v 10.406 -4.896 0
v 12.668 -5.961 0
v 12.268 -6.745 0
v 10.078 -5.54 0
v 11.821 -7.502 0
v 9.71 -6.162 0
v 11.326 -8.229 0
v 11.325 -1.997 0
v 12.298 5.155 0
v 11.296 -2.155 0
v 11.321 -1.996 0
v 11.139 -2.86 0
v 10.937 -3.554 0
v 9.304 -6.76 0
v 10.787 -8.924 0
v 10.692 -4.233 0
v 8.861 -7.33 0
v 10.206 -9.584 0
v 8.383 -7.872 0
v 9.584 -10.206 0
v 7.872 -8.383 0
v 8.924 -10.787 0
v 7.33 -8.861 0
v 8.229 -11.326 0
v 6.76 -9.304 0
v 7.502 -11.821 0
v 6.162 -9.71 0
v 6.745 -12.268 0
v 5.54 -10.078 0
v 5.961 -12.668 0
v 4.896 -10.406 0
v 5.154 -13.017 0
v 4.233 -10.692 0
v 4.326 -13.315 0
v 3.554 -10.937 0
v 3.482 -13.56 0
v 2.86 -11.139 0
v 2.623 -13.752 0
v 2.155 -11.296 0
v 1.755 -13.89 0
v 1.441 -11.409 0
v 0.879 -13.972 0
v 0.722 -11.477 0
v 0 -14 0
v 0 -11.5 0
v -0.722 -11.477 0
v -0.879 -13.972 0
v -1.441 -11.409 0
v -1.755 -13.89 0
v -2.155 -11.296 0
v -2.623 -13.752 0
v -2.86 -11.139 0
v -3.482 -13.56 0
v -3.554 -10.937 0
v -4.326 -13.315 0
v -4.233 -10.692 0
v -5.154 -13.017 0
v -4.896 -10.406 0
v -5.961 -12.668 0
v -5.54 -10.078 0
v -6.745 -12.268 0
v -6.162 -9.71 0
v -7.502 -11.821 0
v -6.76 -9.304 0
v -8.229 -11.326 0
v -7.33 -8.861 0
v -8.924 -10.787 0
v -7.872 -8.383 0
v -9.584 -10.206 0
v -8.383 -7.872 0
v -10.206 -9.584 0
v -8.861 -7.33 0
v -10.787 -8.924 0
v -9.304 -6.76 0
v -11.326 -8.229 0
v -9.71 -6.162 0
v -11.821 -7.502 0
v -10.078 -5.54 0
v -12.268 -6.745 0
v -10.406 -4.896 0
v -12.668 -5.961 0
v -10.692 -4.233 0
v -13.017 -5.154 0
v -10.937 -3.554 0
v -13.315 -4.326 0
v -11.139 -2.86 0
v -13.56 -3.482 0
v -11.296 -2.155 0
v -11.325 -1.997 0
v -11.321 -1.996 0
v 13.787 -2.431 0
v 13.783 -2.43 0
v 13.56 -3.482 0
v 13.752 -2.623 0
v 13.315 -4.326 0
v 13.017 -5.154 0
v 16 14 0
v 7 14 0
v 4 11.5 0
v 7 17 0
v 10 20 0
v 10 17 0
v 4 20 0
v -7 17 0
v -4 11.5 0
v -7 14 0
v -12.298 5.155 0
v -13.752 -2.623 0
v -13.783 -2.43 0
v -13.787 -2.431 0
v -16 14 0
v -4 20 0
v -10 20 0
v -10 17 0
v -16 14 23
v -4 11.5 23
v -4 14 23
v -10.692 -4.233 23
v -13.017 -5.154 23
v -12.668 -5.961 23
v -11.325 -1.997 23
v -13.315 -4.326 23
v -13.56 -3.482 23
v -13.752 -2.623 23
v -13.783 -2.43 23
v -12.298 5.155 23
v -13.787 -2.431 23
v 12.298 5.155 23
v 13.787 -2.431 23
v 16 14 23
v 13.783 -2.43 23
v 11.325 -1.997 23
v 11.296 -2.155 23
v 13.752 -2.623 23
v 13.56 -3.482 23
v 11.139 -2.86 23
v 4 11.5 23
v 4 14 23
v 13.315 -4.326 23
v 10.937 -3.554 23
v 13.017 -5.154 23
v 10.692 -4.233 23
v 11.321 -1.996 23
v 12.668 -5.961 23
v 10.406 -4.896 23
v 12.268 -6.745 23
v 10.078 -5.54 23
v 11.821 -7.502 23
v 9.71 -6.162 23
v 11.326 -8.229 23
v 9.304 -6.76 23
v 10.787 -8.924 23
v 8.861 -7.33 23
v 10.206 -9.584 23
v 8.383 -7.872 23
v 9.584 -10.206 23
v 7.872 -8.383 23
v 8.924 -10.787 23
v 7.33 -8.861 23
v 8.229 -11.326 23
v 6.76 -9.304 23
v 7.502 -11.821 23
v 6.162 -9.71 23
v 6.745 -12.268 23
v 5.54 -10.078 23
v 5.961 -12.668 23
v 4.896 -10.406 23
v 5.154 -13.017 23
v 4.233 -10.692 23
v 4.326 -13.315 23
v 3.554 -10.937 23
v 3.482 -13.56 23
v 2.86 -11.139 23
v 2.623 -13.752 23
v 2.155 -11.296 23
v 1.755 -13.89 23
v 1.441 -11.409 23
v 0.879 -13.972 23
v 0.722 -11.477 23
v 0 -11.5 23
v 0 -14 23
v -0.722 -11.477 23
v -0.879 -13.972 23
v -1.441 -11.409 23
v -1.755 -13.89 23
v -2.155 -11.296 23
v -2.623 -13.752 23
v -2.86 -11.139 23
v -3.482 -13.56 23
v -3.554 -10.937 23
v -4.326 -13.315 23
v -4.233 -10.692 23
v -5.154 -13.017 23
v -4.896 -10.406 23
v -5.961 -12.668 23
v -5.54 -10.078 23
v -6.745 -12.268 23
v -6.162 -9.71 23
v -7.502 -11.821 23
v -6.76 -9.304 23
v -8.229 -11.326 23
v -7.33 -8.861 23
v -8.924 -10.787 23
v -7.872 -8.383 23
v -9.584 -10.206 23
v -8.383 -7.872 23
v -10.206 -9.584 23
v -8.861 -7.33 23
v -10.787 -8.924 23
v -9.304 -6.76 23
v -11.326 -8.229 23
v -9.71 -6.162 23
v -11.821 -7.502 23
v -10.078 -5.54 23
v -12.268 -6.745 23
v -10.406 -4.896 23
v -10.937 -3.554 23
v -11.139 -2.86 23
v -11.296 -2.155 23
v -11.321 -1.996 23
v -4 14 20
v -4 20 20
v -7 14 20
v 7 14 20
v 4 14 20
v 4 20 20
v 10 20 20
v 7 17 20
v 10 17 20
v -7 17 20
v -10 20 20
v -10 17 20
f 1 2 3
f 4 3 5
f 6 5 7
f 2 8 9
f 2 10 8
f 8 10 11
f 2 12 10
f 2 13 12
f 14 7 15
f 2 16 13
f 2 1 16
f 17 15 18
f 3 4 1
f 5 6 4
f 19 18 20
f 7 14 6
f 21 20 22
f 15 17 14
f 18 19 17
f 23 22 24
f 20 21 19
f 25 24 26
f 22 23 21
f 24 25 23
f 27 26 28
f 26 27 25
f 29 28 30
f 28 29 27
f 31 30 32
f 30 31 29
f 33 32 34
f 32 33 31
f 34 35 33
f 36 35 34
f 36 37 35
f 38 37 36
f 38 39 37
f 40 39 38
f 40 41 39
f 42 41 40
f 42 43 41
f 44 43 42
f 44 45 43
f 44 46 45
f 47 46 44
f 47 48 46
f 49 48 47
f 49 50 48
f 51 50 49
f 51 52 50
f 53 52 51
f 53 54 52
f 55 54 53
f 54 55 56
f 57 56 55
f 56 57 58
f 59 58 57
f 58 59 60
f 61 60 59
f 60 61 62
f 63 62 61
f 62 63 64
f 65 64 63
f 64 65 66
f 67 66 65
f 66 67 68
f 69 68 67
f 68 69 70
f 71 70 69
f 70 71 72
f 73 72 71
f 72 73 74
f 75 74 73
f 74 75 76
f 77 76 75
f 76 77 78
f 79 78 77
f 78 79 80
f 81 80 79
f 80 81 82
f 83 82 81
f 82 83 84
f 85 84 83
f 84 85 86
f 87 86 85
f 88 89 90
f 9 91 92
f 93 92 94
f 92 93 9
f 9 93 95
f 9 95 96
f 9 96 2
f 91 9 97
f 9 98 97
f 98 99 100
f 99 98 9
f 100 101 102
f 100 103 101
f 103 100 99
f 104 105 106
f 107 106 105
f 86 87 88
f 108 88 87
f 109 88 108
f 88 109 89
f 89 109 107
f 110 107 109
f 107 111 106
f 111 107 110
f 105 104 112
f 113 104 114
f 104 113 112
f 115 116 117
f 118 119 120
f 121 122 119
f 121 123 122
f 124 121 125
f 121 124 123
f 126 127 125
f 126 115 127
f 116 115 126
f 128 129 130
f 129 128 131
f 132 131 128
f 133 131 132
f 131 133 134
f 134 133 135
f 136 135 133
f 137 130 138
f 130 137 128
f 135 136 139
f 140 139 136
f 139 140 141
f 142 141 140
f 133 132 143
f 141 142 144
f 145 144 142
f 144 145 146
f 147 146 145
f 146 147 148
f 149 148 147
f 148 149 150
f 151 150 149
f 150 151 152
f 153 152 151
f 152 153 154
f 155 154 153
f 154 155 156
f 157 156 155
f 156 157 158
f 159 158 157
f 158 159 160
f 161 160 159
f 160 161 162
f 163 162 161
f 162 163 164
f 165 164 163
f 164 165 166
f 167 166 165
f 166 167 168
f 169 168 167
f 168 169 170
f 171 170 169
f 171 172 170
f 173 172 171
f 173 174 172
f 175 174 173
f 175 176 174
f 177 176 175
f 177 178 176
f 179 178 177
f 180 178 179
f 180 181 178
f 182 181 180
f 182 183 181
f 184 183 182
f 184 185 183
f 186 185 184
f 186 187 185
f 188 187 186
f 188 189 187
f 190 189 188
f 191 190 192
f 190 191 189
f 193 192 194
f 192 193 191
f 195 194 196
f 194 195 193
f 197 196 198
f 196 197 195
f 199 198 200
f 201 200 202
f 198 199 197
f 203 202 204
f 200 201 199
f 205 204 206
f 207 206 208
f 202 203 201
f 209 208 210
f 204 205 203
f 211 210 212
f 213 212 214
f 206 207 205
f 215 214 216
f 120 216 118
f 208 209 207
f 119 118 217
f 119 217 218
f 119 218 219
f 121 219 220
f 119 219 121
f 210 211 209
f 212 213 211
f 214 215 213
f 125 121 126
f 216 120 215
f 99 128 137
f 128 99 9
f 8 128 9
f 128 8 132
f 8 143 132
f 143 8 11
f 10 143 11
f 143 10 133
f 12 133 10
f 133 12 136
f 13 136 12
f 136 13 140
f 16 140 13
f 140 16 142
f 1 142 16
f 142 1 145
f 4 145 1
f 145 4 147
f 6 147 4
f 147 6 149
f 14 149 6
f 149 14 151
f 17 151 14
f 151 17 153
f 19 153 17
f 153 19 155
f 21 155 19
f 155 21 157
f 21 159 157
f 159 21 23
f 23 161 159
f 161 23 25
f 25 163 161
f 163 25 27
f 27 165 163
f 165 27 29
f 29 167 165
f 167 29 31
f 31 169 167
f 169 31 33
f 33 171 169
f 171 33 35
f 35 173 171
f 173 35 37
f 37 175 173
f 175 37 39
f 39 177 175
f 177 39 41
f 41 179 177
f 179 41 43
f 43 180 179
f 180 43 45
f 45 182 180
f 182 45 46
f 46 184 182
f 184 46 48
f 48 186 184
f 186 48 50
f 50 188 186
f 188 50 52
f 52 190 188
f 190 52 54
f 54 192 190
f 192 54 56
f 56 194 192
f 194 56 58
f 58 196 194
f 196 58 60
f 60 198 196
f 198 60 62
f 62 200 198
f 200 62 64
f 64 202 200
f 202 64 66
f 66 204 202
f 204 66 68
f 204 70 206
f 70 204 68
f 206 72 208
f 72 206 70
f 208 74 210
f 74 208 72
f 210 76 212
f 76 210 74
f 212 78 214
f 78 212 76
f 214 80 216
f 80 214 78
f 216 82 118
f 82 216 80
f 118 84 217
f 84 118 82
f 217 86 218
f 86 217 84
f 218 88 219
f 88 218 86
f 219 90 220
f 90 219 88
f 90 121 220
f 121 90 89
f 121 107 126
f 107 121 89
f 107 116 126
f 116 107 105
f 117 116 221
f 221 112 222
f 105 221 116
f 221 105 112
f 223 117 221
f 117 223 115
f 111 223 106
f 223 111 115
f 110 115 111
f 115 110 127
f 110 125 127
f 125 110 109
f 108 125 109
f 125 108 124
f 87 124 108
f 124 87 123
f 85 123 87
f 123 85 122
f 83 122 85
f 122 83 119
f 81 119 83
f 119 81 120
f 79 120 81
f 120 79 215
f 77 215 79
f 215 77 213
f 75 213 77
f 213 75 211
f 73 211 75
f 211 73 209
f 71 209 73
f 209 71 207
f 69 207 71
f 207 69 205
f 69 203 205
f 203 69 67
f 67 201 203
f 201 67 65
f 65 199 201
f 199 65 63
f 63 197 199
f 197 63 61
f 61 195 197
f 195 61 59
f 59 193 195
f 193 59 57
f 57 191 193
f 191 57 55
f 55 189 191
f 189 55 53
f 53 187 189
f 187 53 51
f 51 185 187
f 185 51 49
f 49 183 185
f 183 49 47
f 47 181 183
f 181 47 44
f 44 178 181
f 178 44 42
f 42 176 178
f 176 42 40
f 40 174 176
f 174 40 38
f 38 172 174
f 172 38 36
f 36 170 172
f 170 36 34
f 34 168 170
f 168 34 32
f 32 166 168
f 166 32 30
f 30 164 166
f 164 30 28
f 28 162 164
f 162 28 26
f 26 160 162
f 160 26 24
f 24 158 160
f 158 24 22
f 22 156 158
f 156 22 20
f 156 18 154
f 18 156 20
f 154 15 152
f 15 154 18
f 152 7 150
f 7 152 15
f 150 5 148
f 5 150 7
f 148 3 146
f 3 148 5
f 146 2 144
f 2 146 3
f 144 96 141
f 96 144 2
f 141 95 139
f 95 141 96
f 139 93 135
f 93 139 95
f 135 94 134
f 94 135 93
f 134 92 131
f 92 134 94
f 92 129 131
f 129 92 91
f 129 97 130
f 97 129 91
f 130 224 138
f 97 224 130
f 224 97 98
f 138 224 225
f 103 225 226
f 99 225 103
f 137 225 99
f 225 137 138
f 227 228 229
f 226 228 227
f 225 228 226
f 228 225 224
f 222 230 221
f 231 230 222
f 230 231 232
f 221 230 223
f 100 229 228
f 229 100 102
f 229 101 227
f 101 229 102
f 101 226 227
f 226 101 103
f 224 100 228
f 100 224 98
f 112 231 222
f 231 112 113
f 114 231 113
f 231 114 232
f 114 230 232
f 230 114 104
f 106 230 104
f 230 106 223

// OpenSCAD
$fn=100;

linear_extrude(23) {
  difference() {
    circle(22 / 2 + 0.5 + 2.5);
    circle(22 / 2 + 0.5);
    polygon([
      [-14*cos(-10),14*sin(-10)],
      [0,0],
      [14*cos(-10),14*sin(-10)],
      [20,20],
      [-20,20]]);
  }
  polygon([
    [14*cos(-10),14*sin(-10)],
    [16,14],
    [13.5,14],
    [11.5*cos(-10),11.5*sin(-10)]
  ]);
  polygon([
    [16,14],
    [4,14],
    [4,11.5],
    [12.5,5]
  ]);
  polygon([
    [-14*cos(-10),14*sin(-10)],
    [-16,14],
    [-13.5,14],
    [-11.5*cos(-10),11.5*sin(-10)]
  ]);
  polygon([
    [-16,14],
    [-4,14],
    [-4,11.5],
    [-12.5,5]
  ]);
}

linear_extrude(20) {
  polygon([
    [4,14],
    [4,20],
    [10,20],
    [10,17],
    [7,17],
    [7,14]
  ]);
  polygon([
    [-4,14],
    [-4,20],
    [-10,20],
    [-10,17],
    [-7,17],
    [-7,14]
  ]);
}
